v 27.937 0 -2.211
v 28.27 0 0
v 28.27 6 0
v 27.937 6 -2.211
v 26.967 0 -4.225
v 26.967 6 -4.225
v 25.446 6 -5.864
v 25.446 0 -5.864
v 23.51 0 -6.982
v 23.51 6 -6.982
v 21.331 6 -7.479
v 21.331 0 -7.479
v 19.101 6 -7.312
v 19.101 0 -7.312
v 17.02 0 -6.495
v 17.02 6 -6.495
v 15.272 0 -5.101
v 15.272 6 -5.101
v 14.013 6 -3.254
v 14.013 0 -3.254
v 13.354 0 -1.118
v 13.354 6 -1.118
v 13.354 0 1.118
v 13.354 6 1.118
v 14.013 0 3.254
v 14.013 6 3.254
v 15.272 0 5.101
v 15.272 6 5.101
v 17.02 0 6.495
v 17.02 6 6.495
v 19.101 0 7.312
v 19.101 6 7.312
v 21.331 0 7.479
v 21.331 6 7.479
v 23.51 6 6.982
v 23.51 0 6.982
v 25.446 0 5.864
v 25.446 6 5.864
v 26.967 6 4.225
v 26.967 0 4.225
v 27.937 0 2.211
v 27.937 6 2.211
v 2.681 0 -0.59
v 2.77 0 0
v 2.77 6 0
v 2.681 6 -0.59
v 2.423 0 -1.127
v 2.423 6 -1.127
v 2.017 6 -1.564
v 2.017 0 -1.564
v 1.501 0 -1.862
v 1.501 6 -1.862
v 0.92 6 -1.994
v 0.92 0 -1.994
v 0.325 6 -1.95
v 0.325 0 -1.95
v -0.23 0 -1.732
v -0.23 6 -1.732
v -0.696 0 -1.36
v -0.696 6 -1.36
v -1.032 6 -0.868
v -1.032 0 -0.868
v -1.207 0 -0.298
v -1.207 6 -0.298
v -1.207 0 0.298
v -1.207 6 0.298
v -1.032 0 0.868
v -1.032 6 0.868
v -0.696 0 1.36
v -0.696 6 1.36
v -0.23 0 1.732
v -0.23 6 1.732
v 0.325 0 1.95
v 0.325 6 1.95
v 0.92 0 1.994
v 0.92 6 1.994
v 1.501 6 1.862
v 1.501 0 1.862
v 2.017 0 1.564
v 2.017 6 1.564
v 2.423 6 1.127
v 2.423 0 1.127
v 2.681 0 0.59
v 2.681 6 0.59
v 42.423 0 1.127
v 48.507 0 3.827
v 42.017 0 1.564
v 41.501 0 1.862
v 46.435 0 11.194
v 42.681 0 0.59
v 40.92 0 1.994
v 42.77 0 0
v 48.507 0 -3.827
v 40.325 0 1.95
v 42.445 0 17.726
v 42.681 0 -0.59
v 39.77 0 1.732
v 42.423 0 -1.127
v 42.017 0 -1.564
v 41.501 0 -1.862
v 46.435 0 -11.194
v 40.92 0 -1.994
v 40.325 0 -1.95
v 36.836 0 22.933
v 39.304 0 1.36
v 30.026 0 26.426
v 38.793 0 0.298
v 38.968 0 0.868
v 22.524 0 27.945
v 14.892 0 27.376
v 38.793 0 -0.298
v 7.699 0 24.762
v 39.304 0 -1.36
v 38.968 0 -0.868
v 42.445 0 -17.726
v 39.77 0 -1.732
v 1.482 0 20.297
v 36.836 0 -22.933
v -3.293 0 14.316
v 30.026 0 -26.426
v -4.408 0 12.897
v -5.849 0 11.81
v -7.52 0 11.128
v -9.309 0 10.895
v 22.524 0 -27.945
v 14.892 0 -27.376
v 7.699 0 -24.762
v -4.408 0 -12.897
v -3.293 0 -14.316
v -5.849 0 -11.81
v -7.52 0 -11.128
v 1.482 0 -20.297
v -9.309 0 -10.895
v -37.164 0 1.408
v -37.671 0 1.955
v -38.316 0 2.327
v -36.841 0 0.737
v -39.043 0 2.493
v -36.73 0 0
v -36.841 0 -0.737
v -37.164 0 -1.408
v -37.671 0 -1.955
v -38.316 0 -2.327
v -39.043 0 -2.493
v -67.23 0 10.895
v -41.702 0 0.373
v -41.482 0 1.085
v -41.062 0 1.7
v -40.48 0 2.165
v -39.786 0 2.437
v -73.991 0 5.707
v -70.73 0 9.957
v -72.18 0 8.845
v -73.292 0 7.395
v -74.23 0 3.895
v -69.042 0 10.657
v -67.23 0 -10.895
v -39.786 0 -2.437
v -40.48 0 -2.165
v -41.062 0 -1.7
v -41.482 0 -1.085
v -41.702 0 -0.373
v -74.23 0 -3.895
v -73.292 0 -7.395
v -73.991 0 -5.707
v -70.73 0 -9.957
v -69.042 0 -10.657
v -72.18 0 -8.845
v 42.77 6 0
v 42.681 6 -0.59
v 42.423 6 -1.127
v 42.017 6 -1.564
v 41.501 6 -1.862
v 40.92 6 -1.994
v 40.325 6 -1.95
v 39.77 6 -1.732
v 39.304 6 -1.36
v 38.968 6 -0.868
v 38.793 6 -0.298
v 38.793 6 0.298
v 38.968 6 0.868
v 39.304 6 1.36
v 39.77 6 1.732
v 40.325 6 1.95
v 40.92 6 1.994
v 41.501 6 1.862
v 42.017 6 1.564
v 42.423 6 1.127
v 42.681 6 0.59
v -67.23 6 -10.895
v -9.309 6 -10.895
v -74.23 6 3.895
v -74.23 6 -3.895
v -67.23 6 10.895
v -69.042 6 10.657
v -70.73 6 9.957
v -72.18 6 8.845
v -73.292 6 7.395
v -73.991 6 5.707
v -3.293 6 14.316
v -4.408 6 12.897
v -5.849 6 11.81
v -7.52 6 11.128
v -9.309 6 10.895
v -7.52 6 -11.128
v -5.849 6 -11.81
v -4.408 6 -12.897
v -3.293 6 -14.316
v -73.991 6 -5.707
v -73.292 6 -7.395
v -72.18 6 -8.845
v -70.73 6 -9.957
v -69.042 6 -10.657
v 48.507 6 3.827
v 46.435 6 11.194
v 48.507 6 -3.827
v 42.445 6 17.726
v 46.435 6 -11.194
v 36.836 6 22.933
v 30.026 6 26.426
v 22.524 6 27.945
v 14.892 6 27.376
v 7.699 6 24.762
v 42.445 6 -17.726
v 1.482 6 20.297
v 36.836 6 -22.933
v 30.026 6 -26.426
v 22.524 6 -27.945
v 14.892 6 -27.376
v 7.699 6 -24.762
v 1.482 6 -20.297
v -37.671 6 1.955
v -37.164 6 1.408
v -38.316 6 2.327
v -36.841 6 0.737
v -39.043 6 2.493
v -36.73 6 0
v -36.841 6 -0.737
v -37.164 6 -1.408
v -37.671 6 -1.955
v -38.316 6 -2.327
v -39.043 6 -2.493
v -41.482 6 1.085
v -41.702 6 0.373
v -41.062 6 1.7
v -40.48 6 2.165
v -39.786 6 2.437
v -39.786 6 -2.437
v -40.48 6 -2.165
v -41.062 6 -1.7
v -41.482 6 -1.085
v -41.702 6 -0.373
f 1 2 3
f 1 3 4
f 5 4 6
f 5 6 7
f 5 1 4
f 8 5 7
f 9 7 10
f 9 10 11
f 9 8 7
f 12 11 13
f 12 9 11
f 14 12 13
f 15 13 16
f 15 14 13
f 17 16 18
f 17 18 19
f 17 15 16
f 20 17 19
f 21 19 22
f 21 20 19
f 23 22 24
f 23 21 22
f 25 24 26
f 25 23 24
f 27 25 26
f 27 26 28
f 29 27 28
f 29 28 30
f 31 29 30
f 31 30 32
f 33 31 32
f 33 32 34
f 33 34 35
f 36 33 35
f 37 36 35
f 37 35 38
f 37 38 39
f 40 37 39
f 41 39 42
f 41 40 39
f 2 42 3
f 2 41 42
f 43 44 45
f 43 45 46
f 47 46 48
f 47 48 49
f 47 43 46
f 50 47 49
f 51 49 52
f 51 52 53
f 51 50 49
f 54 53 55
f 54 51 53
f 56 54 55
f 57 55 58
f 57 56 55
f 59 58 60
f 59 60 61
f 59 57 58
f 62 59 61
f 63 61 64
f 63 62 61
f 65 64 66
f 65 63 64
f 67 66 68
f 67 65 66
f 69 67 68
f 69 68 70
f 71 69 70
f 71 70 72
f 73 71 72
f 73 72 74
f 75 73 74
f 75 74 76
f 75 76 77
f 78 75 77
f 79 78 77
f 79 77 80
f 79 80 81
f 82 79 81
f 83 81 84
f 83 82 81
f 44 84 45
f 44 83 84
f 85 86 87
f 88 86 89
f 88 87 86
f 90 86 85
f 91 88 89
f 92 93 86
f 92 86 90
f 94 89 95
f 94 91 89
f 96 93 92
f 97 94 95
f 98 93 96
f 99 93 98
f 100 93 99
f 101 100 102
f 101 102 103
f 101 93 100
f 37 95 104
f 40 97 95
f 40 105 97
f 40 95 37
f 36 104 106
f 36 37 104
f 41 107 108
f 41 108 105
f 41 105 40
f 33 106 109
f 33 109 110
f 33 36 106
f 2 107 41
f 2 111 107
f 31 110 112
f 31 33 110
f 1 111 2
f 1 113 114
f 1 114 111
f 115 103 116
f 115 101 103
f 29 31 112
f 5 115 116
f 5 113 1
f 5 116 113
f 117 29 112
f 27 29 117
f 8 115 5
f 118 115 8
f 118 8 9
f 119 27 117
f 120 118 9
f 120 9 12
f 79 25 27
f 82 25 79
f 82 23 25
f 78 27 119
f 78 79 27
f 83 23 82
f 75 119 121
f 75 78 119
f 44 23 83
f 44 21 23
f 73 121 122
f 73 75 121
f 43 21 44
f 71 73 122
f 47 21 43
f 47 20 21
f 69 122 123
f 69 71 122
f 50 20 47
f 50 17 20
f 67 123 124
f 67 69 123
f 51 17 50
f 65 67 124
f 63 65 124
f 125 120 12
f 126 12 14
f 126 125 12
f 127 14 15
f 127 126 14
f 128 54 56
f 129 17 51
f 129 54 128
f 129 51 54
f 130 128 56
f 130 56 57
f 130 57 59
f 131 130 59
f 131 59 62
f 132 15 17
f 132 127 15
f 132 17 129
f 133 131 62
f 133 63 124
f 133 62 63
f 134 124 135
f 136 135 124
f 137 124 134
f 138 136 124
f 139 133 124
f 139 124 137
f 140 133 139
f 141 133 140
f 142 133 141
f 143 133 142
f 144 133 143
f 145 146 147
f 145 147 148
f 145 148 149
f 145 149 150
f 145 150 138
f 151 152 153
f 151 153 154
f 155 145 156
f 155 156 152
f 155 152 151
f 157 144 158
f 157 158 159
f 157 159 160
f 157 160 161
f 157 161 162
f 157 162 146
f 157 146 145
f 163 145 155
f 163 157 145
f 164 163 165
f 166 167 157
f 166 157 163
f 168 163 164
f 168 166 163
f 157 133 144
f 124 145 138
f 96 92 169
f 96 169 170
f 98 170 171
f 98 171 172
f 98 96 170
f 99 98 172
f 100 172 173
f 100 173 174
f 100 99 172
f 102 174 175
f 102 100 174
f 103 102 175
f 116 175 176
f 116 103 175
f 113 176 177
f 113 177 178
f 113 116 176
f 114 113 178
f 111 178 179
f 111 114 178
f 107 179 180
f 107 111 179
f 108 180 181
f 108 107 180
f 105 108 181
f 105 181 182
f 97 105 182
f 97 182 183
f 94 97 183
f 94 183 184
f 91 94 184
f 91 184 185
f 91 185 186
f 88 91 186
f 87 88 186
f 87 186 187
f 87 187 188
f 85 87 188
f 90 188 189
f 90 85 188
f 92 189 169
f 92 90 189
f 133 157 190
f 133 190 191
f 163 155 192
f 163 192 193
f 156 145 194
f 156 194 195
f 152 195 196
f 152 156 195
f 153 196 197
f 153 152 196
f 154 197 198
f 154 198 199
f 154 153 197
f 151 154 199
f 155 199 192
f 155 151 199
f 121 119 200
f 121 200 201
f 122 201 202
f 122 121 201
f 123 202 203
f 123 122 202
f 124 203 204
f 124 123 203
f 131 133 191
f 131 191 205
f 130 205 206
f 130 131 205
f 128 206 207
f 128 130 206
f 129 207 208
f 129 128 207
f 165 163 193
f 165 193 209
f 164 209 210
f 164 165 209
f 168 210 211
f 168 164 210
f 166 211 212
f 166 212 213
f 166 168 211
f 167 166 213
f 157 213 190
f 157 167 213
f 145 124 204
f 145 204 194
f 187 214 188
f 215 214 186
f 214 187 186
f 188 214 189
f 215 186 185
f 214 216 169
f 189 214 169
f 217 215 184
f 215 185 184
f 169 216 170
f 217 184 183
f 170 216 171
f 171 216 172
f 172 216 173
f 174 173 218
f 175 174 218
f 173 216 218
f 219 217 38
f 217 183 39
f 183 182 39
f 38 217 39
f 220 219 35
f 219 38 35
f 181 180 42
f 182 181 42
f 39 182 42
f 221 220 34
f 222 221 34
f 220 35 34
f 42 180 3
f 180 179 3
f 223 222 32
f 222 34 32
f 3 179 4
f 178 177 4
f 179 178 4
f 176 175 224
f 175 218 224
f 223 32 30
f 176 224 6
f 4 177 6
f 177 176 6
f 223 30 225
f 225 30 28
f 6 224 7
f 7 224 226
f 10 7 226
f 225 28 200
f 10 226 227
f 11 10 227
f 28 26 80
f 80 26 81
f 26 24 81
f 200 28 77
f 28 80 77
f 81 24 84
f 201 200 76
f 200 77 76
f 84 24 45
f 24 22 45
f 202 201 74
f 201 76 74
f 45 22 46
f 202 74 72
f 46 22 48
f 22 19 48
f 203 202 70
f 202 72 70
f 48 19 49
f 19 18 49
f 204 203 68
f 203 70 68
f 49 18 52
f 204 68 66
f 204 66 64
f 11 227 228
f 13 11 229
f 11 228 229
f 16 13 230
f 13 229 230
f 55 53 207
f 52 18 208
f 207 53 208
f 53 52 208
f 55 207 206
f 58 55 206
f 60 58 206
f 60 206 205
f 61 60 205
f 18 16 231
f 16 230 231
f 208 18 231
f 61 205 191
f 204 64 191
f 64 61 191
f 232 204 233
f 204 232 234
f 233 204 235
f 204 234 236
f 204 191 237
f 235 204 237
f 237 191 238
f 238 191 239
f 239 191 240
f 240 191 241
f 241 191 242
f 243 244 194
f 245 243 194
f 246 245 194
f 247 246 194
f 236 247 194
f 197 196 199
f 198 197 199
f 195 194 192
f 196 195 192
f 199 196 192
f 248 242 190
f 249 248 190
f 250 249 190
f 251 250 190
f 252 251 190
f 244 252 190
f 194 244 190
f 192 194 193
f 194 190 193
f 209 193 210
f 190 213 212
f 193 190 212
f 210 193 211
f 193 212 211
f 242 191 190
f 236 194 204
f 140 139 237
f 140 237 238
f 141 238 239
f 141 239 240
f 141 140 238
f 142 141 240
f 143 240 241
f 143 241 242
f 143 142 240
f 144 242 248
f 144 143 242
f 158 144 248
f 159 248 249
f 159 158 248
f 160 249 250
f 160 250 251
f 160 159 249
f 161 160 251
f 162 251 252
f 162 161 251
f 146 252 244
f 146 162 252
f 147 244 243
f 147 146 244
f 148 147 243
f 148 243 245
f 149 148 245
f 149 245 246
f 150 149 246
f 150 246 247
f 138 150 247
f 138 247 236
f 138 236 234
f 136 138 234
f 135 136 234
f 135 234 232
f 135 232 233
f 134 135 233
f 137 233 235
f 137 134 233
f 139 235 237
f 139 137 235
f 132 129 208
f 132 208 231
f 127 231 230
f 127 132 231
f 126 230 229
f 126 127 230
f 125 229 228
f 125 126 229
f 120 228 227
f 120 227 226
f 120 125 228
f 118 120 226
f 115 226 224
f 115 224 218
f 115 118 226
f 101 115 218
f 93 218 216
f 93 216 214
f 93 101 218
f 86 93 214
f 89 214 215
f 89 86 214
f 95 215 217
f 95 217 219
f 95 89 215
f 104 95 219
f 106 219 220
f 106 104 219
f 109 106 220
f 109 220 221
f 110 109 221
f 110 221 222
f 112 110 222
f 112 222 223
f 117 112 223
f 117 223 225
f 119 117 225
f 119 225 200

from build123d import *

# Parameters (mm, degrees)
ESQUISSE1_R        = 2
ESQUISSE1_R_2      = 7.5
ESQUISSE1_R_3      = 2.5
BOSS_EXTRU_1_DEPTH = 6


with BuildPart() as part:
    # Esquisse1 → Boss.-Extru.1 (new body)
    with BuildSketch(Plane(origin=(0, 0, 0), x_dir=(1, 0, 0), z_dir=(0, 1, 0))):
        with BuildLine():
            Line((-74.229814571, -3.895021171), (-74.229814571, 3.895021171))
            ThreePointArc((-74.229814571, 3.895021171), (-72.17956204, 8.844768639), (-67.229814571, 10.895021171))
            Line((-67.229814571, 10.895021171), (-9.309179879, 10.895021171))
            ThreePointArc((-9.309179879, 10.895021171), (-5.848907465, 11.810079526), (-3.293306817, 14.316016937))
            ThreePointArc((-3.293306817, 14.316016937), (48.770185429, 0), (-3.293306817, -14.316016937))
            ThreePointArc((-3.293306817, -14.316016937), (-5.848907465, -11.810079526), (-9.309179879, -10.895021171))
            Line((-9.309179879, -10.895021171), (-67.229814571, -10.895021171))
            ThreePointArc((-67.229814571, -10.895021171), (-72.17956204, -8.844768639), (-74.229814571, -3.895021171))
        make_face()
        with Locations((40.770185429, 0)):
            Circle(ESQUISSE1_R, mode=Mode.SUBTRACT)
        with Locations((20.770185429, 0)):
            Circle(ESQUISSE1_R_2, mode=Mode.SUBTRACT)
        with Locations((0.770185429, 0)):
            Circle(ESQUISSE1_R, mode=Mode.SUBTRACT)
        with Locations((-39.229814571, 0)):
            Circle(ESQUISSE1_R_3, mode=Mode.SUBTRACT)
    extrude(amount=BOSS_EXTRU_1_DEPTH)


solid = part.part
